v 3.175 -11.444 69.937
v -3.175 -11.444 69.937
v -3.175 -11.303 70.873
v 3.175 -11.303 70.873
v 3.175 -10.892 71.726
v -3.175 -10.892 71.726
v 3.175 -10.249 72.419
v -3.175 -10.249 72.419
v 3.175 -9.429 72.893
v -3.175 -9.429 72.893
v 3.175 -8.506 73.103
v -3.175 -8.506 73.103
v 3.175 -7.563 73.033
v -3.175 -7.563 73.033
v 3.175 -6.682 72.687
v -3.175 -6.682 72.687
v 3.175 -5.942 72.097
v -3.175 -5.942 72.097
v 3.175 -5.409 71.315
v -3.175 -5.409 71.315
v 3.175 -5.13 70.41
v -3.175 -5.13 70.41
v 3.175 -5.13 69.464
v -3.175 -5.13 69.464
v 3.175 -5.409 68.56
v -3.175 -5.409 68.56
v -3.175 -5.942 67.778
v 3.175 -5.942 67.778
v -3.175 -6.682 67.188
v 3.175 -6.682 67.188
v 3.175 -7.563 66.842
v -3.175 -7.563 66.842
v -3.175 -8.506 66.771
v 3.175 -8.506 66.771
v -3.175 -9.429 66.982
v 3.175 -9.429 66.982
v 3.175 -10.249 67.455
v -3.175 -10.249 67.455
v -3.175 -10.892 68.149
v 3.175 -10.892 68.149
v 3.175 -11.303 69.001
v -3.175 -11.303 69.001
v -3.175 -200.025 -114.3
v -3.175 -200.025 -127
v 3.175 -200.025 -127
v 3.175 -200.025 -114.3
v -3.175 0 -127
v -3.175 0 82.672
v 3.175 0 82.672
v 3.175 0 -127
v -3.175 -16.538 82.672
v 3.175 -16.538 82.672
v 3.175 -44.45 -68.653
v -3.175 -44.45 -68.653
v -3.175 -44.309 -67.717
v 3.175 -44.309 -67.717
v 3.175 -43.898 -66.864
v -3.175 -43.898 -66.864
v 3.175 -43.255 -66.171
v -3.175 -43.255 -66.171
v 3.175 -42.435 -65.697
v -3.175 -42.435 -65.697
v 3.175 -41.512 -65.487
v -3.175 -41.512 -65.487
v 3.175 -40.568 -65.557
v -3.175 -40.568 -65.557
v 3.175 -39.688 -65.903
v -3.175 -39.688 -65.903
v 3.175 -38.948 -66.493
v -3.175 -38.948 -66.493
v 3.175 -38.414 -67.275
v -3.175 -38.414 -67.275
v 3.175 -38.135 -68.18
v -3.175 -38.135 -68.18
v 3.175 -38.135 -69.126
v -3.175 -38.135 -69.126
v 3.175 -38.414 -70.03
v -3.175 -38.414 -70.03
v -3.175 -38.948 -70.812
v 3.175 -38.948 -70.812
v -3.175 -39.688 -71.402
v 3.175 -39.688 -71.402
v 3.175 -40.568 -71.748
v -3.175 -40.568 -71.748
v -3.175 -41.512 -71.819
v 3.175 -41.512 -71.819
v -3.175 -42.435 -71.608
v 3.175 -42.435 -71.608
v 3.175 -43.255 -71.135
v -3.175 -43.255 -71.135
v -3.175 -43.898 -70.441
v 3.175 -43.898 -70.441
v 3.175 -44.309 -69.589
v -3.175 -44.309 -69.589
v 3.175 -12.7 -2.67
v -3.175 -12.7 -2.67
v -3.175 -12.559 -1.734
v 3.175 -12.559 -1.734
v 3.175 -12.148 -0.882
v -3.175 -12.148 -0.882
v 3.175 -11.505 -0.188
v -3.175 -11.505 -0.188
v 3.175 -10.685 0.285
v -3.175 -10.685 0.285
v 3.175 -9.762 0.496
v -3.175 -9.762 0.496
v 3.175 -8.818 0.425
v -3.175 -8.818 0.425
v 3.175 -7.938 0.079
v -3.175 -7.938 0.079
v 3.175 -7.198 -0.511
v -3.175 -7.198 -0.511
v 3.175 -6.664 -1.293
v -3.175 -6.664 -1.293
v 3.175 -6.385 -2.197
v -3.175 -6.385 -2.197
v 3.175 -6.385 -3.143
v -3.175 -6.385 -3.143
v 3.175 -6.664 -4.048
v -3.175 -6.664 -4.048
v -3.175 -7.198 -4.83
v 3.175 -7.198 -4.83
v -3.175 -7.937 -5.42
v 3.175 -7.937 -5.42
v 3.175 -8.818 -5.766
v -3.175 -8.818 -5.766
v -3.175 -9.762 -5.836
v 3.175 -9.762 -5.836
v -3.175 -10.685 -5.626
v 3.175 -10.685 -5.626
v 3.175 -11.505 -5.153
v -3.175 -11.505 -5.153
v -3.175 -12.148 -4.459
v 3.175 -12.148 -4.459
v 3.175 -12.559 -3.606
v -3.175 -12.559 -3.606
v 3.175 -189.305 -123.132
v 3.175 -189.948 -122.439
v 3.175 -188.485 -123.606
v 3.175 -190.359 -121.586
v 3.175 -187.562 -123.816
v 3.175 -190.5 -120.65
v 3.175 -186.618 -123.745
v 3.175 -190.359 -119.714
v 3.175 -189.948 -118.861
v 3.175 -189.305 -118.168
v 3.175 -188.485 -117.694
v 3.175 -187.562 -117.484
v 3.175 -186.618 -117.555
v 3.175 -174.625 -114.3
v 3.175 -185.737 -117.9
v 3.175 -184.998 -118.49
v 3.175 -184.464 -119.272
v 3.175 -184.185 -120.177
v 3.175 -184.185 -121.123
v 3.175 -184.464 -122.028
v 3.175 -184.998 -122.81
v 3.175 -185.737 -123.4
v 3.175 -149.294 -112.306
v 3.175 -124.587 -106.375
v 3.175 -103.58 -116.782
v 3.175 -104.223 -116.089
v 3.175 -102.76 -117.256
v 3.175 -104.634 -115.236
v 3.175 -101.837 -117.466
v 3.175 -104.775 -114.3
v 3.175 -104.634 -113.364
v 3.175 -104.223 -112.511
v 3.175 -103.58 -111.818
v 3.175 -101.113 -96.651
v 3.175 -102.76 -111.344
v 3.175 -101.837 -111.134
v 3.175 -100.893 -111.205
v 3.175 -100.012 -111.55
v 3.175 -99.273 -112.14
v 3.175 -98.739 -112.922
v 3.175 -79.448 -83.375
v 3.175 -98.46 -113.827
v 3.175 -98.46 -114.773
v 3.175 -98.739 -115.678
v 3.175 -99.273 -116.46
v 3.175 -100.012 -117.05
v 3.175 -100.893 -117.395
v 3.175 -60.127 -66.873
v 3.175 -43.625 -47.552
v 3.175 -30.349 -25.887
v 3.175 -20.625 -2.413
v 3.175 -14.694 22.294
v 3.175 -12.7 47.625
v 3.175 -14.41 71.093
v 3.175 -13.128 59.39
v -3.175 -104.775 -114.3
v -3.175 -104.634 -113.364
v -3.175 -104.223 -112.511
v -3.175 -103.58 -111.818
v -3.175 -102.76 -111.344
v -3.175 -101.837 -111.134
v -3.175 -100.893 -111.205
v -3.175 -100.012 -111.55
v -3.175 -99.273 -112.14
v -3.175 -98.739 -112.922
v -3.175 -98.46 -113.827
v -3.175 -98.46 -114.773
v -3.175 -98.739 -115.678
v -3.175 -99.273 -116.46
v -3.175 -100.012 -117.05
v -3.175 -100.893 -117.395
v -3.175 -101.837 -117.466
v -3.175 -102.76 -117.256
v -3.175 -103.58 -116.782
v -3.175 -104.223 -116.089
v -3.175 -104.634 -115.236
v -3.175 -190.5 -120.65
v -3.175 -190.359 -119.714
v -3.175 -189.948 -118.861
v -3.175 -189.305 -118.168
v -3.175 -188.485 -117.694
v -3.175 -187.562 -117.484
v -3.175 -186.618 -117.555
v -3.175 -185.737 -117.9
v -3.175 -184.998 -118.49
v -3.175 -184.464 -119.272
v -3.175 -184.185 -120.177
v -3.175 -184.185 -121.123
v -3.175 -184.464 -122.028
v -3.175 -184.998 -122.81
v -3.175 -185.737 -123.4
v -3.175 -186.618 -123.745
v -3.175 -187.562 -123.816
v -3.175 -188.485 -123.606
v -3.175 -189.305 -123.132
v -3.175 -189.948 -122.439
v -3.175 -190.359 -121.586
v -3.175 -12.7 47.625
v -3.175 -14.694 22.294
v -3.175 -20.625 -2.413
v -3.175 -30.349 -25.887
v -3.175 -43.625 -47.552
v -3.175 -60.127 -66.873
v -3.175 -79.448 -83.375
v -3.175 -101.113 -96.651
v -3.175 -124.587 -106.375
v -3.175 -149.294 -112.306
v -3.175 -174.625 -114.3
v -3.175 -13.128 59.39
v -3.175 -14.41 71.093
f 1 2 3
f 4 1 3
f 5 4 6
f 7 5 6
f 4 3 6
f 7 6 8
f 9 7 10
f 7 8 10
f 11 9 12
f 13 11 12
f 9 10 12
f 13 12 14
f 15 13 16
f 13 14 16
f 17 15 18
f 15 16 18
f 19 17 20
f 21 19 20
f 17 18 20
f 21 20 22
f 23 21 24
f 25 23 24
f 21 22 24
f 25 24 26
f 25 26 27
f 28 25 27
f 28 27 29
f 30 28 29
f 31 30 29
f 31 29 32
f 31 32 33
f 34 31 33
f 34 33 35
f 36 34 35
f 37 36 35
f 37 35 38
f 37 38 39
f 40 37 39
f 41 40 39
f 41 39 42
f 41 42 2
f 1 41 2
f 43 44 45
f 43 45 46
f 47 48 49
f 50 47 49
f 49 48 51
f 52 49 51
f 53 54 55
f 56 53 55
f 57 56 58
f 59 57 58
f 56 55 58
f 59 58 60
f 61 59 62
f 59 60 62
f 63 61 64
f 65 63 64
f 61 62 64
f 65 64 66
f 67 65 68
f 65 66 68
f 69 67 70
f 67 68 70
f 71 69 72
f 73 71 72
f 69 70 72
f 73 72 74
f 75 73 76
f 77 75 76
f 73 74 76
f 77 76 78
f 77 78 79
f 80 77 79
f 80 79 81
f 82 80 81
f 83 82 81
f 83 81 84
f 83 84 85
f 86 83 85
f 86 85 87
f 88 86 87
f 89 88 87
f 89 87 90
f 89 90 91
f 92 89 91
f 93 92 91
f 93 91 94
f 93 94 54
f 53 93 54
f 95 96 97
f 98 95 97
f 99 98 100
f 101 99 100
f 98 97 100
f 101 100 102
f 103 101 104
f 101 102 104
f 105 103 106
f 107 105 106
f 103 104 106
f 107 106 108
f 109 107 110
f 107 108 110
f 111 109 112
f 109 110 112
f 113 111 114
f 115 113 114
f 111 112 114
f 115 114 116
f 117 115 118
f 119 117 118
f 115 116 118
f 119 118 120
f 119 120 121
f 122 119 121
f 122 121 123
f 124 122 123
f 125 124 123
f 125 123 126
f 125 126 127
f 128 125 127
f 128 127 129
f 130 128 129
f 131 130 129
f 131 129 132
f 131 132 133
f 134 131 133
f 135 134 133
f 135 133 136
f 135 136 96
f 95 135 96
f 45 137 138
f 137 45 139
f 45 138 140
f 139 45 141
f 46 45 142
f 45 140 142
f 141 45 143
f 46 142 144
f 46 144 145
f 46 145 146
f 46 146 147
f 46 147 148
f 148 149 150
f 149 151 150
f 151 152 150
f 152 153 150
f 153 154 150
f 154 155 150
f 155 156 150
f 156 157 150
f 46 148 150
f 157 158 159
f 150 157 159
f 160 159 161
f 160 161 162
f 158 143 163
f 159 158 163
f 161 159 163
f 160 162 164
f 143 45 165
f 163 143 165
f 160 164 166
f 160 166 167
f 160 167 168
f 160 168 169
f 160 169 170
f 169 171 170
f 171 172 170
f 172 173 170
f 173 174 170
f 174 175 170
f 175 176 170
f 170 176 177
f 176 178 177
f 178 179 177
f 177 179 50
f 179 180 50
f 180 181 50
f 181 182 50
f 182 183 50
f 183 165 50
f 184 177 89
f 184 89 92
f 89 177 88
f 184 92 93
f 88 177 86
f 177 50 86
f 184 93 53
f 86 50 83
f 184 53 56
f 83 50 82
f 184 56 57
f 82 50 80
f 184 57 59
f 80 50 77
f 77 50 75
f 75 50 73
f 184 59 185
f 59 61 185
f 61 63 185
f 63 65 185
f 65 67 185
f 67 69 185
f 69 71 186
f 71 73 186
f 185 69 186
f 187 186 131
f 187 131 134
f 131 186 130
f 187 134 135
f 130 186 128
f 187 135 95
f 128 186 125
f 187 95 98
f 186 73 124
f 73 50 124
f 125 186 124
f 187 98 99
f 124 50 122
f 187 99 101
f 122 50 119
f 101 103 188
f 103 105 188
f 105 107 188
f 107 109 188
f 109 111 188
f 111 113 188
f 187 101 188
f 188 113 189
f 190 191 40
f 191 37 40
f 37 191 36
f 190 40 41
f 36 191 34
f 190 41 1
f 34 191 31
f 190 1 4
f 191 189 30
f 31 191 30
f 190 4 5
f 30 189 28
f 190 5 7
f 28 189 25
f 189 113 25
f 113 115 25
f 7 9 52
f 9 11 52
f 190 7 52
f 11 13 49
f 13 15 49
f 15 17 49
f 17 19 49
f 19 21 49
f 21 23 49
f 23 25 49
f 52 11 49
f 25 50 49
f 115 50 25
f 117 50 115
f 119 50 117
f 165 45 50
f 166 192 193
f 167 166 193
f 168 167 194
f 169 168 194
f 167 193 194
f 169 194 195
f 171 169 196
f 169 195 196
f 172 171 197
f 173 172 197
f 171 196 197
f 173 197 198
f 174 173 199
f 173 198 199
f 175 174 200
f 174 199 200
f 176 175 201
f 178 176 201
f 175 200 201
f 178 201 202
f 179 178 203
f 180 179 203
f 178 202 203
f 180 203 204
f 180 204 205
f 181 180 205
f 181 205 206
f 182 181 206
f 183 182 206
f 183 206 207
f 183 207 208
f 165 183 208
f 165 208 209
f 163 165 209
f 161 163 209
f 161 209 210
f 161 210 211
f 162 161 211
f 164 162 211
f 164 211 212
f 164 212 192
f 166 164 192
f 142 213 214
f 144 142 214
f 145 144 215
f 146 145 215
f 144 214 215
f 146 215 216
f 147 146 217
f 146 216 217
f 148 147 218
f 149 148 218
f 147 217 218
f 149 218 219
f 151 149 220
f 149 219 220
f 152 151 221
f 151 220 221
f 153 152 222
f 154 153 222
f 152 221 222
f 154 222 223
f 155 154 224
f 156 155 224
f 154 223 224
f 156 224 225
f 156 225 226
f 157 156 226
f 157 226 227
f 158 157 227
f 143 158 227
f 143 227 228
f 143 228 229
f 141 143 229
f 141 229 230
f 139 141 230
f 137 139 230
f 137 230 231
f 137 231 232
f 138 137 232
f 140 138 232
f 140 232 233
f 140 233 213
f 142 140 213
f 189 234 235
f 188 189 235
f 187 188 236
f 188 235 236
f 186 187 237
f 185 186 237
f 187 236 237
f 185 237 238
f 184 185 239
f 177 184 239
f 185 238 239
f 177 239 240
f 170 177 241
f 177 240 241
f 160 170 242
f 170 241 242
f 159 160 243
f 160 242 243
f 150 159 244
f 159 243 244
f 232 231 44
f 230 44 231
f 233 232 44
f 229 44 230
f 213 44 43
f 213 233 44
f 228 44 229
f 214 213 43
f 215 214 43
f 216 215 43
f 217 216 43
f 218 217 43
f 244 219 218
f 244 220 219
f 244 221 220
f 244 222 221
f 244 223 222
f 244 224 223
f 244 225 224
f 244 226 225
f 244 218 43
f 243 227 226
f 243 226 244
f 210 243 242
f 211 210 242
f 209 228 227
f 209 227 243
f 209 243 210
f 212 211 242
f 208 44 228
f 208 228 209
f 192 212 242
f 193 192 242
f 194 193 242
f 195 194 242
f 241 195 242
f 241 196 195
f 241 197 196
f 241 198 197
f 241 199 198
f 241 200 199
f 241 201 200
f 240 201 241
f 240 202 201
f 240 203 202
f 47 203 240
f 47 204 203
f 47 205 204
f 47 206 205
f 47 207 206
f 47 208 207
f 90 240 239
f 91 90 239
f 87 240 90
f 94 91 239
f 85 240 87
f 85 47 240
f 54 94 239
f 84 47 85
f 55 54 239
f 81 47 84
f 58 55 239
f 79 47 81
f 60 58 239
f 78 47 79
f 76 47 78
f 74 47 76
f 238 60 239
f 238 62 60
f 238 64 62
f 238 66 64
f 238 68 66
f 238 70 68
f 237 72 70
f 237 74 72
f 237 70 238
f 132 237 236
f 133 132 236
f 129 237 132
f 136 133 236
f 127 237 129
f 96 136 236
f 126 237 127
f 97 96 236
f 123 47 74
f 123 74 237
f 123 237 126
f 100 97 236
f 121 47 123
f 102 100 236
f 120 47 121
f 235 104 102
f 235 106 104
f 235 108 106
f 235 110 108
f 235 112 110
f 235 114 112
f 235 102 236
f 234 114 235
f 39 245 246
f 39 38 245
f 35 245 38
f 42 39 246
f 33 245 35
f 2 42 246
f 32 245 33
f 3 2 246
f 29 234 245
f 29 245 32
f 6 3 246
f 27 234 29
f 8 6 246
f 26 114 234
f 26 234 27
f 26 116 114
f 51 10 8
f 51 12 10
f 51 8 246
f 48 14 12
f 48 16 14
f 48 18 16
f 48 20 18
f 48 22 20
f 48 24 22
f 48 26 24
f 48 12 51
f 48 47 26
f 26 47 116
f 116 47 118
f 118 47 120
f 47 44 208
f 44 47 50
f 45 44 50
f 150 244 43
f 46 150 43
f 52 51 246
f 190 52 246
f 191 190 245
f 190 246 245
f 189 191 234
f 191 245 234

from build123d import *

# Parameters (mm, degrees)
F0_W     = 6.35
F0_H     = 254
F1_DEPTH = 279.4
F3_DEPTH = 25.4
F4_W     = 79.375
F4_H     = 12.7
F5_DEPTH = 25.4
F7_D     = 6.35


with BuildPart() as f1:
    # F0 (on Front) → F1 (new body)
    with BuildSketch(Plane.XZ):
        Rectangle(F0_W, F0_H)
    extrude(amount=F1_DEPTH)

    # F2 (on face) → F3 (cut)
    with BuildSketch(Plane(origin=(-3.175, 0, 0), x_dir=(0, -1, 0), z_dir=(-1, 0, 0))):
        with BuildLine():
            Line((0, 82.671984), (16.538269, 82.671984))
            Line((16.538269, 82.671984), (174.625, 47.625))
            Line((174.625, 47.625), (12.7, 47.625))
            ThreePointArc((12.7, 47.625), (60.126734, -66.873266), (174.625, -114.3))
            Line((174.625, -114.3), (279.4, -114.3))
            Line((279.4, -114.3), (279.4, 127))
            Line((279.4, 127), (0, 127))
            Line((0, 127), (0, 82.671984))
        make_face()
        with BuildLine():
            Line((174.625, 47.625), (16.538269, 82.671984))
            ThreePointArc((16.538269, 82.671984), (13.662427, 65.253269), (12.7, 47.625))
            Line((12.7, 47.625), (174.625, 47.625))
        make_face()
    extrude(amount=-F3_DEPTH, mode=Mode.SUBTRACT)

    # F4 (on face) → F5 (cut)
    with BuildSketch(Plane(origin=(-3.175, 0, 0), x_dir=(0, -1, 0), z_dir=(-1, 0, 0))):
        with Locations((239.7125, -120.65)):
            Rectangle(F4_W, F4_H)
    extrude(amount=-F5_DEPTH, mode=Mode.SUBTRACT)

    # F7 (through all)
    with Locations(Plane.YZ.offset(3.175)):
        with Locations((-187.325, -120.65), (-101.6, -114.3), (-41.275, -68.652838), (-9.525, -2.670206), (-8.269135, 69.937184)):
            Hole(F7_D / 2)


solid = f1.part
